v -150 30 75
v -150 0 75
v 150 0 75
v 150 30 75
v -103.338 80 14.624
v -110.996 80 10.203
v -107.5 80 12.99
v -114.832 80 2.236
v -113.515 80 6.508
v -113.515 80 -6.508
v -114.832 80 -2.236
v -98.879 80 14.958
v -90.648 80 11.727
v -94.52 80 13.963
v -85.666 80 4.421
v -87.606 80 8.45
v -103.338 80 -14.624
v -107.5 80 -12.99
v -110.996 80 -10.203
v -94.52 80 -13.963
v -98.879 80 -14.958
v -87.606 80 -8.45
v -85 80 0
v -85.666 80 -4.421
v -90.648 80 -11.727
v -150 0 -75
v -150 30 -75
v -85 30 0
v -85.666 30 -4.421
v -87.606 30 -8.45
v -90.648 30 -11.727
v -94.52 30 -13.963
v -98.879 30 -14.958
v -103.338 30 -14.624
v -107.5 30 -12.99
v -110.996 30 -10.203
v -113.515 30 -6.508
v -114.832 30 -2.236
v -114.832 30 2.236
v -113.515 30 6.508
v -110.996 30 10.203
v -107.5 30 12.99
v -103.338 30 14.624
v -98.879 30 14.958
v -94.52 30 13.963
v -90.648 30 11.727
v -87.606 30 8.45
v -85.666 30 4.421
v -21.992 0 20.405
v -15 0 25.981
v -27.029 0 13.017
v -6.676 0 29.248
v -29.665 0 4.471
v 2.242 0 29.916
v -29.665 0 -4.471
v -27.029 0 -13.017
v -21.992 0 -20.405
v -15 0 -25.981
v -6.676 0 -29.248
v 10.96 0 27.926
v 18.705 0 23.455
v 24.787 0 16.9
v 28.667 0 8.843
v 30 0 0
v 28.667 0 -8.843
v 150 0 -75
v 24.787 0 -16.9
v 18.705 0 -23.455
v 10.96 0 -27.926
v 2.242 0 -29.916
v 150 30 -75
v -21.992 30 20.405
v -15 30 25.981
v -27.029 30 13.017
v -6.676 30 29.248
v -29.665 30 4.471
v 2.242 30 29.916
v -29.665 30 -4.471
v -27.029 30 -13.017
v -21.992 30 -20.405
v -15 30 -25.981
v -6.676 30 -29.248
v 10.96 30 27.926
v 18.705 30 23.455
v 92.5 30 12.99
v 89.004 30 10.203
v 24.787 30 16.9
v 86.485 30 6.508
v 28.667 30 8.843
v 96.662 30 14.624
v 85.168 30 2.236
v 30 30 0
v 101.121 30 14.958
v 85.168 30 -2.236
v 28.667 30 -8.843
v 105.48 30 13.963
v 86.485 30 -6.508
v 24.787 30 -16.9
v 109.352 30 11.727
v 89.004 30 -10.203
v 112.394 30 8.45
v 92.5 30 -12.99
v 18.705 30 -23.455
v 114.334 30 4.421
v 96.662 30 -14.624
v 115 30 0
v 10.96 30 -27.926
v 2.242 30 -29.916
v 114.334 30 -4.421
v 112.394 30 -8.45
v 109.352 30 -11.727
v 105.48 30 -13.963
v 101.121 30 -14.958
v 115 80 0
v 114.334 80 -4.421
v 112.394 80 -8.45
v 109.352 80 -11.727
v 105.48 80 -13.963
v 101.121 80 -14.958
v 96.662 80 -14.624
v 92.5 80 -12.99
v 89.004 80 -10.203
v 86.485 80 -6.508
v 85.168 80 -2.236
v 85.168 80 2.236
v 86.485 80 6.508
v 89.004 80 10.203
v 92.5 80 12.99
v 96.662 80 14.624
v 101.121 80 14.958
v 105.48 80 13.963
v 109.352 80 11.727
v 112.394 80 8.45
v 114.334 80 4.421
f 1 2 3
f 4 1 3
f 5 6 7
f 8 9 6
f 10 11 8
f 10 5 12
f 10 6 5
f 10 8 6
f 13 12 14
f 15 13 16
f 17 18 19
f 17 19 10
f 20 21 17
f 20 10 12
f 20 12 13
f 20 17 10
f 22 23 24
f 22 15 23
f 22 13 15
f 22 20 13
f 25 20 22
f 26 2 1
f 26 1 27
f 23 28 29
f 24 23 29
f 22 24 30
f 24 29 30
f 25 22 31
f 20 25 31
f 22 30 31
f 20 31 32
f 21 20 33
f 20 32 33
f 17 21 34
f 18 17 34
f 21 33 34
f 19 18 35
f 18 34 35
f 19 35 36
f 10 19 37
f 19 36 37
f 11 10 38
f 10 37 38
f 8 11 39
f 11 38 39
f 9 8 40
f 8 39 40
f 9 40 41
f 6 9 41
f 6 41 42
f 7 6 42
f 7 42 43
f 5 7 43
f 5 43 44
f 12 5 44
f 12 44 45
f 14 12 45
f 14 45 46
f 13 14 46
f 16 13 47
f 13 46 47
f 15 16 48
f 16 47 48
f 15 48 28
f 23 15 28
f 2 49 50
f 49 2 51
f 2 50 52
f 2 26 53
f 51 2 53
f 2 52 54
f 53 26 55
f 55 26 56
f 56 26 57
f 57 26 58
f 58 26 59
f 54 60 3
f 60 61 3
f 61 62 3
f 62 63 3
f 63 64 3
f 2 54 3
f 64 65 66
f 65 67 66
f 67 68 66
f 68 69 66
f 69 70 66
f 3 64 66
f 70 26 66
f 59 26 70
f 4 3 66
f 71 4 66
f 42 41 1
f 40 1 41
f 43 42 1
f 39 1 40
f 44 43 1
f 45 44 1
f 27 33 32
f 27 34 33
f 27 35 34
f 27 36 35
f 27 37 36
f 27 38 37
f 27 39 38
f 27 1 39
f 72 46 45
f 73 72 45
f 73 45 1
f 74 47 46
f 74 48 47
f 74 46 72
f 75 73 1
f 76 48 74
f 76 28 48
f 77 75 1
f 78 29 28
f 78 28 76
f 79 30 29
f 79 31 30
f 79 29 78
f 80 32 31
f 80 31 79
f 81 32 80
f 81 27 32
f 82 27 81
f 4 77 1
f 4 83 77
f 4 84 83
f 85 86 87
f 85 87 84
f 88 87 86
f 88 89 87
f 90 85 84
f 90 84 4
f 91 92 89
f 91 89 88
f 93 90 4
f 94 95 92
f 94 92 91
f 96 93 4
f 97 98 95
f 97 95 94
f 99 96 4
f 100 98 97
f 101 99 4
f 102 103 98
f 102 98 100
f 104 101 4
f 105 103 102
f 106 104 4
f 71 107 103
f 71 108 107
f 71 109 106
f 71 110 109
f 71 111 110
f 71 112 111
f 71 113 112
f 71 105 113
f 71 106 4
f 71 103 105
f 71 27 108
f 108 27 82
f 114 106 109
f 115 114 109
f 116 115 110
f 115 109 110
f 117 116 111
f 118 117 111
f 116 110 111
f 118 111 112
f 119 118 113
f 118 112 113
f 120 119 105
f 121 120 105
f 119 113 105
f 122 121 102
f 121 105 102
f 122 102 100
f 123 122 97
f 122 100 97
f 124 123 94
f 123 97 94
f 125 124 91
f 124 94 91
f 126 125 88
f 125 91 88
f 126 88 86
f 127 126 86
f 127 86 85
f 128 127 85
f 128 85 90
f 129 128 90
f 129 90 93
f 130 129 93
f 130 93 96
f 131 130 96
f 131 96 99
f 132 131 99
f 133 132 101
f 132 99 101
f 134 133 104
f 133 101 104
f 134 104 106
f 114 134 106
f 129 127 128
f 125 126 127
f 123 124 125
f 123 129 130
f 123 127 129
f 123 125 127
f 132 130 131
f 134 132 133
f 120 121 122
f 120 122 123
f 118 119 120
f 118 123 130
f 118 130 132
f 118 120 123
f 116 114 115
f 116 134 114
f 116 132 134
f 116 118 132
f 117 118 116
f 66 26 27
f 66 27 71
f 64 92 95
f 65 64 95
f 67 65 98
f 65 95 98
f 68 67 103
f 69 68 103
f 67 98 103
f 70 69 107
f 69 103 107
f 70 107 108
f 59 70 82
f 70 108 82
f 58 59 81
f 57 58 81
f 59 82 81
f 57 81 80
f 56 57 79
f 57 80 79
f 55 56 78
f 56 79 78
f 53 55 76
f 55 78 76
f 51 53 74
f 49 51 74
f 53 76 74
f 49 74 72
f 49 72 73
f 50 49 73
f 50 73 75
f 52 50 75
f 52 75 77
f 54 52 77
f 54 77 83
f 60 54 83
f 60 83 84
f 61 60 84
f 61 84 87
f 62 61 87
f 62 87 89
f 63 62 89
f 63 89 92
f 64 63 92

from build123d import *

# Parameters (mm, degrees)
SKETCH_1_W          = 300
SKETCH_1_H          = 150
EXTRUDE_1_DEPTH     = 30
SKETCH_2_R          = 15
EXTRUDE_2_DEPTH     = 50
SKETCH_3_R          = 30
CUT_EXTRUDE_1_DEPTH = 50


with BuildPart() as part:
    # 草图1 → 凸台-拉伸1 (new body)
    with BuildSketch(Plane(origin=(0, 0, 0), x_dir=(1, 0, 0), z_dir=(0, 1, 0))):
        Rectangle(SKETCH_1_W, SKETCH_1_H)
    extrude(amount=EXTRUDE_1_DEPTH)

    # 草图2 → 凸台-拉伸2 (add)
    with BuildSketch(Plane(origin=(0, 30, 0), x_dir=(1, 0, 0), z_dir=(0, 1, 0))):
        with Locations((-100, 0)):
            Circle(SKETCH_2_R)
        with Locations((100, 0)):
            Circle(SKETCH_2_R)
    extrude(amount=EXTRUDE_2_DEPTH)

    # 草图3 → 切除-拉伸1 (cut)
    with BuildSketch(Plane(origin=(0, 30, 0), x_dir=(1, 0, 0), z_dir=(0, 1, 0))):
        Circle(SKETCH_3_R)
    extrude(amount=-CUT_EXTRUDE_1_DEPTH, mode=Mode.SUBTRACT)


solid = part.part
